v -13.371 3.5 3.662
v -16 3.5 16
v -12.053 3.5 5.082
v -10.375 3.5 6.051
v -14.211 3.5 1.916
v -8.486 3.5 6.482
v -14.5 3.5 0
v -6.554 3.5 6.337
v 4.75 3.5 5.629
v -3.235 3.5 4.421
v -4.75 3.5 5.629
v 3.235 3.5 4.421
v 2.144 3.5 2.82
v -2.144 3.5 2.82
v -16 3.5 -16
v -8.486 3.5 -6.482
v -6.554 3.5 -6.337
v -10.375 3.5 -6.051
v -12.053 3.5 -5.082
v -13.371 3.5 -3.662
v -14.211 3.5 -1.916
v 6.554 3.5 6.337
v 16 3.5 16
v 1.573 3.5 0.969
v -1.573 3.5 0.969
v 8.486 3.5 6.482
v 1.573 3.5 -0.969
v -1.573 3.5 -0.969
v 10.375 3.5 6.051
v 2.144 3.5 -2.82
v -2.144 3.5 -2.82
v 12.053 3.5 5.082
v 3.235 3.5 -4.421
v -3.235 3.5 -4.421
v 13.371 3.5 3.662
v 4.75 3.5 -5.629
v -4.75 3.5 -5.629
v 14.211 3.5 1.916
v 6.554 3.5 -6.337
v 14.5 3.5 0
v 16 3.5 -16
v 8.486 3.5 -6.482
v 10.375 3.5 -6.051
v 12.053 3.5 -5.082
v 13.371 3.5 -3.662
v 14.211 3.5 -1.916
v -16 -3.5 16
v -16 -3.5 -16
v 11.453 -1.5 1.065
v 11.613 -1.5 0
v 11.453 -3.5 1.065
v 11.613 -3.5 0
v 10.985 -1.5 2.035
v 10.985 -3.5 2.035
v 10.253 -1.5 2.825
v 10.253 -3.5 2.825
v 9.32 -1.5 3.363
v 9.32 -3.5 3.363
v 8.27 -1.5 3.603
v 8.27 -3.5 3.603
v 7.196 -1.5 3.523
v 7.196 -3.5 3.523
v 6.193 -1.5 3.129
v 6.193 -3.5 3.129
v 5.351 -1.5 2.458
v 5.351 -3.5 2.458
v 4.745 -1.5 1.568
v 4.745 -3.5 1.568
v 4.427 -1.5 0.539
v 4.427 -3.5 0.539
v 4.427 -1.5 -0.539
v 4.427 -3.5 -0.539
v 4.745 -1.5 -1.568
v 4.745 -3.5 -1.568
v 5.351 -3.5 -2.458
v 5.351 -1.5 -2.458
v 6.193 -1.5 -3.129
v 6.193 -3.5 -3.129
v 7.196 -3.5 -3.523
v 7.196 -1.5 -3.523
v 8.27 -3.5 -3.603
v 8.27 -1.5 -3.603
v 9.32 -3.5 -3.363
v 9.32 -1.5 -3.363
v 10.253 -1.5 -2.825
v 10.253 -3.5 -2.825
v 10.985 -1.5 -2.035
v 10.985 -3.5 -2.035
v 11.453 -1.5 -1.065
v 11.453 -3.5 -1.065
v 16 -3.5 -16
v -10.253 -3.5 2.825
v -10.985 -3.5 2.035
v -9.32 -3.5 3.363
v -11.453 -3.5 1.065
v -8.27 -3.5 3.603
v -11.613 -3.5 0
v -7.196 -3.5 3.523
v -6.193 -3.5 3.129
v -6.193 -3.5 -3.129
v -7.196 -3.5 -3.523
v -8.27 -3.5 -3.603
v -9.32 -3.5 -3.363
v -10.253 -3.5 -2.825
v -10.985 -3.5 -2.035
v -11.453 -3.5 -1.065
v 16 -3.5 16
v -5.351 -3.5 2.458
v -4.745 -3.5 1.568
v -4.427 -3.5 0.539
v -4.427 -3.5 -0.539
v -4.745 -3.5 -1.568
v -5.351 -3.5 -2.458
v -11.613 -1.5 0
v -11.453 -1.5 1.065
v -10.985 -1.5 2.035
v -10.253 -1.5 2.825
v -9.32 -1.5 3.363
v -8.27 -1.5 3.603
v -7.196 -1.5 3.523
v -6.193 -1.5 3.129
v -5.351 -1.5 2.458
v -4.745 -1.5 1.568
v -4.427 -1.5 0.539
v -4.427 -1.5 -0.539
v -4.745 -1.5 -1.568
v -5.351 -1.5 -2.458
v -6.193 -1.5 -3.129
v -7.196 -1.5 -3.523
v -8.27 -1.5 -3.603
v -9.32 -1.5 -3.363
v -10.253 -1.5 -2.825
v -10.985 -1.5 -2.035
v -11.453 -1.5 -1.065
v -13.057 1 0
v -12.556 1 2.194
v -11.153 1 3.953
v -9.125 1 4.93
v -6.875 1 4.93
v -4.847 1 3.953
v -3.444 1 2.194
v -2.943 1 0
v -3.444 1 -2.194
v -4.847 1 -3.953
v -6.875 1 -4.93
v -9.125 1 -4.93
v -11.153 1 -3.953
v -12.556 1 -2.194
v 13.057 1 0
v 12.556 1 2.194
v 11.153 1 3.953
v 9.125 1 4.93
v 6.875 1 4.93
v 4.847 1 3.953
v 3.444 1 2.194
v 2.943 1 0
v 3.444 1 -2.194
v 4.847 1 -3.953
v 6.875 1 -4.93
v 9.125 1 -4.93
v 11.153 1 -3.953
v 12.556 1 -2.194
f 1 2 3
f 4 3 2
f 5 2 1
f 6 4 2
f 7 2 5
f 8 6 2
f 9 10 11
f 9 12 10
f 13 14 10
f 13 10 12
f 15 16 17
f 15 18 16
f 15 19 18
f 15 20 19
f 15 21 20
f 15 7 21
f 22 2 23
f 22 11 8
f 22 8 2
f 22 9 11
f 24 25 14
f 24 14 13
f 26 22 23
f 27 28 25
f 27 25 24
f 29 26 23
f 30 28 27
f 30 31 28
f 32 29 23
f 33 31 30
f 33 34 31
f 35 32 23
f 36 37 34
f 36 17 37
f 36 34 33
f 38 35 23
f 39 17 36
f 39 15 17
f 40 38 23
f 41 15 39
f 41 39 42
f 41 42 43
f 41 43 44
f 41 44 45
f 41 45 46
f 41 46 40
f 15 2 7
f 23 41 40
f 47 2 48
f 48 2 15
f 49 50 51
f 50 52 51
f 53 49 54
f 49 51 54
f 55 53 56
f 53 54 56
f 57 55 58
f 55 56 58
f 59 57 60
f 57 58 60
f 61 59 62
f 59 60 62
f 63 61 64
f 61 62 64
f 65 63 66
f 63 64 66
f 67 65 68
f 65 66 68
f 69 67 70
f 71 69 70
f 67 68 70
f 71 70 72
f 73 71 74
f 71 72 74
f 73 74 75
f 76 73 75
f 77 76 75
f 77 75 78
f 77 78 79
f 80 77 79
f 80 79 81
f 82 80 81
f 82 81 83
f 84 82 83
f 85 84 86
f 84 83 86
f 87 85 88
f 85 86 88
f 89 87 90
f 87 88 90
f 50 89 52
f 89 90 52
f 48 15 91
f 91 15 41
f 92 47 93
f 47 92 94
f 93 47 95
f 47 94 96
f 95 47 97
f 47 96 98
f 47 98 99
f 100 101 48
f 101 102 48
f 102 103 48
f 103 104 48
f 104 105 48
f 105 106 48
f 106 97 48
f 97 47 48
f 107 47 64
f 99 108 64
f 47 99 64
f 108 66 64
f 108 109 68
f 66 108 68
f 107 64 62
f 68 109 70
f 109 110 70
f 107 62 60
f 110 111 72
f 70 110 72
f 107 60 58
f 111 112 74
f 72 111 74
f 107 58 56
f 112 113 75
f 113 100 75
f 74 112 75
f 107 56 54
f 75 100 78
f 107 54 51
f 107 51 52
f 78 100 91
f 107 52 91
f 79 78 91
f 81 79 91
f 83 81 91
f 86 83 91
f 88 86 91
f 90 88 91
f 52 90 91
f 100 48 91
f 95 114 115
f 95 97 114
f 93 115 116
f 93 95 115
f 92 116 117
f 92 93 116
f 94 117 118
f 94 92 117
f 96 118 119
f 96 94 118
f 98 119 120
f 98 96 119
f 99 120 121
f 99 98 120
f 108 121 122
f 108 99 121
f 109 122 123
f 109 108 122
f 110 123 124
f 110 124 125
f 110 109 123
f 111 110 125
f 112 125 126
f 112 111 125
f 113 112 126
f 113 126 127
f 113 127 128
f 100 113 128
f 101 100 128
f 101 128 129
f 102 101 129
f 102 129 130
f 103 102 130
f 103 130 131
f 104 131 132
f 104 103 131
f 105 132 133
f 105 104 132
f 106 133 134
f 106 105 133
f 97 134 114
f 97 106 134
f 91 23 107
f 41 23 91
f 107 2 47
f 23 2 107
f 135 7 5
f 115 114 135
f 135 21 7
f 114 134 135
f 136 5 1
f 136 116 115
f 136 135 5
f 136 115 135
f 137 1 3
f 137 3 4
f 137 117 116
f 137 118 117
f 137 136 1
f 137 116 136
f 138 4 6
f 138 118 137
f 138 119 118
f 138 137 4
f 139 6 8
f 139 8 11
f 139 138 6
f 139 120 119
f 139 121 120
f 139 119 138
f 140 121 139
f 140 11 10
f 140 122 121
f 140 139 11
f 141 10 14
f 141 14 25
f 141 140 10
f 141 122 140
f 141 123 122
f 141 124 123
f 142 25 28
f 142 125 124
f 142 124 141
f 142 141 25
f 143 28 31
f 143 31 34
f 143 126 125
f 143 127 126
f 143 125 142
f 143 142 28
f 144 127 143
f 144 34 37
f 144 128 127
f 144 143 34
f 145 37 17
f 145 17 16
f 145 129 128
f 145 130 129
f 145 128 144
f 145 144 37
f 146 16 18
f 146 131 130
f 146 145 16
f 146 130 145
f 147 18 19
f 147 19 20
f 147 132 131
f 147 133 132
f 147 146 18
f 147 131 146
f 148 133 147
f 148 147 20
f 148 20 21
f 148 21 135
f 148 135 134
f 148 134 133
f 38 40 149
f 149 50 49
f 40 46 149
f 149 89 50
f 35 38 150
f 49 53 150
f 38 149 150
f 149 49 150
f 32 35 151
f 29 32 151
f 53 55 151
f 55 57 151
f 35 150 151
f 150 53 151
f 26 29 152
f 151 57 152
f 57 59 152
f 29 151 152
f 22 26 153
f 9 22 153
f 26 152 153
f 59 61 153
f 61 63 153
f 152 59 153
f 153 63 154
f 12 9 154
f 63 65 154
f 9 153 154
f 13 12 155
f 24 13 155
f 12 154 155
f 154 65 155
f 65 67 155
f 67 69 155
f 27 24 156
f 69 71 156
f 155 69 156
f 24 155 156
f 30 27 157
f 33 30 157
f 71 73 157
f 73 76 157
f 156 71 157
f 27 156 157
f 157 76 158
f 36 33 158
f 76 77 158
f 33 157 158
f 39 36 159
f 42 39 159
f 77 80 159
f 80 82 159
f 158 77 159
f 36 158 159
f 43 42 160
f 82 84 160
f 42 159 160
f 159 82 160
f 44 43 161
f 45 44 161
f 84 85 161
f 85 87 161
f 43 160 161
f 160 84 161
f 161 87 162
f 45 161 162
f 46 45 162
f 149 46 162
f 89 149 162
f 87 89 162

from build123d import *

# Parameters (mm, degrees)
SKETCH1_W           = 32
SKETCH1_H           = 32
BOSS_EXTRUDE1_DEPTH = 3.5


with BuildPart() as part:
    # Sketch1 → Boss-Extrude1 (new body, symmetric)
    with BuildSketch(Plane(origin=(0, 0, 0), x_dir=(1, 0, 0), z_dir=(0, 1, 0))):
        Rectangle(SKETCH1_W, SKETCH1_H)
    extrude(amount=BOSS_EXTRUDE1_DEPTH, both=True)

    # Sketch2 → Cut-Revolve1 (revolve, cut)
    with BuildSketch(Plane.XY):
        Polygon((8, 3.5), (14.5, 3.5), (11.613248654, -1.5), (11.613248654, -3.5), (8, -3.5), align=None)
    cut_revolve1 = revolve(axis=Axis((8, 3.5, 0), (0, -1, 0)), mode=Mode.SUBTRACT)

    # Mirror1: Cut-Revolve1 across plane
    add(cut_revolve1.mirror(Plane(origin=(0, 0, 0), x_dir=(0, 0, 1), z_dir=(1, 0, 0))), mode=Mode.SUBTRACT)


solid = part.part
